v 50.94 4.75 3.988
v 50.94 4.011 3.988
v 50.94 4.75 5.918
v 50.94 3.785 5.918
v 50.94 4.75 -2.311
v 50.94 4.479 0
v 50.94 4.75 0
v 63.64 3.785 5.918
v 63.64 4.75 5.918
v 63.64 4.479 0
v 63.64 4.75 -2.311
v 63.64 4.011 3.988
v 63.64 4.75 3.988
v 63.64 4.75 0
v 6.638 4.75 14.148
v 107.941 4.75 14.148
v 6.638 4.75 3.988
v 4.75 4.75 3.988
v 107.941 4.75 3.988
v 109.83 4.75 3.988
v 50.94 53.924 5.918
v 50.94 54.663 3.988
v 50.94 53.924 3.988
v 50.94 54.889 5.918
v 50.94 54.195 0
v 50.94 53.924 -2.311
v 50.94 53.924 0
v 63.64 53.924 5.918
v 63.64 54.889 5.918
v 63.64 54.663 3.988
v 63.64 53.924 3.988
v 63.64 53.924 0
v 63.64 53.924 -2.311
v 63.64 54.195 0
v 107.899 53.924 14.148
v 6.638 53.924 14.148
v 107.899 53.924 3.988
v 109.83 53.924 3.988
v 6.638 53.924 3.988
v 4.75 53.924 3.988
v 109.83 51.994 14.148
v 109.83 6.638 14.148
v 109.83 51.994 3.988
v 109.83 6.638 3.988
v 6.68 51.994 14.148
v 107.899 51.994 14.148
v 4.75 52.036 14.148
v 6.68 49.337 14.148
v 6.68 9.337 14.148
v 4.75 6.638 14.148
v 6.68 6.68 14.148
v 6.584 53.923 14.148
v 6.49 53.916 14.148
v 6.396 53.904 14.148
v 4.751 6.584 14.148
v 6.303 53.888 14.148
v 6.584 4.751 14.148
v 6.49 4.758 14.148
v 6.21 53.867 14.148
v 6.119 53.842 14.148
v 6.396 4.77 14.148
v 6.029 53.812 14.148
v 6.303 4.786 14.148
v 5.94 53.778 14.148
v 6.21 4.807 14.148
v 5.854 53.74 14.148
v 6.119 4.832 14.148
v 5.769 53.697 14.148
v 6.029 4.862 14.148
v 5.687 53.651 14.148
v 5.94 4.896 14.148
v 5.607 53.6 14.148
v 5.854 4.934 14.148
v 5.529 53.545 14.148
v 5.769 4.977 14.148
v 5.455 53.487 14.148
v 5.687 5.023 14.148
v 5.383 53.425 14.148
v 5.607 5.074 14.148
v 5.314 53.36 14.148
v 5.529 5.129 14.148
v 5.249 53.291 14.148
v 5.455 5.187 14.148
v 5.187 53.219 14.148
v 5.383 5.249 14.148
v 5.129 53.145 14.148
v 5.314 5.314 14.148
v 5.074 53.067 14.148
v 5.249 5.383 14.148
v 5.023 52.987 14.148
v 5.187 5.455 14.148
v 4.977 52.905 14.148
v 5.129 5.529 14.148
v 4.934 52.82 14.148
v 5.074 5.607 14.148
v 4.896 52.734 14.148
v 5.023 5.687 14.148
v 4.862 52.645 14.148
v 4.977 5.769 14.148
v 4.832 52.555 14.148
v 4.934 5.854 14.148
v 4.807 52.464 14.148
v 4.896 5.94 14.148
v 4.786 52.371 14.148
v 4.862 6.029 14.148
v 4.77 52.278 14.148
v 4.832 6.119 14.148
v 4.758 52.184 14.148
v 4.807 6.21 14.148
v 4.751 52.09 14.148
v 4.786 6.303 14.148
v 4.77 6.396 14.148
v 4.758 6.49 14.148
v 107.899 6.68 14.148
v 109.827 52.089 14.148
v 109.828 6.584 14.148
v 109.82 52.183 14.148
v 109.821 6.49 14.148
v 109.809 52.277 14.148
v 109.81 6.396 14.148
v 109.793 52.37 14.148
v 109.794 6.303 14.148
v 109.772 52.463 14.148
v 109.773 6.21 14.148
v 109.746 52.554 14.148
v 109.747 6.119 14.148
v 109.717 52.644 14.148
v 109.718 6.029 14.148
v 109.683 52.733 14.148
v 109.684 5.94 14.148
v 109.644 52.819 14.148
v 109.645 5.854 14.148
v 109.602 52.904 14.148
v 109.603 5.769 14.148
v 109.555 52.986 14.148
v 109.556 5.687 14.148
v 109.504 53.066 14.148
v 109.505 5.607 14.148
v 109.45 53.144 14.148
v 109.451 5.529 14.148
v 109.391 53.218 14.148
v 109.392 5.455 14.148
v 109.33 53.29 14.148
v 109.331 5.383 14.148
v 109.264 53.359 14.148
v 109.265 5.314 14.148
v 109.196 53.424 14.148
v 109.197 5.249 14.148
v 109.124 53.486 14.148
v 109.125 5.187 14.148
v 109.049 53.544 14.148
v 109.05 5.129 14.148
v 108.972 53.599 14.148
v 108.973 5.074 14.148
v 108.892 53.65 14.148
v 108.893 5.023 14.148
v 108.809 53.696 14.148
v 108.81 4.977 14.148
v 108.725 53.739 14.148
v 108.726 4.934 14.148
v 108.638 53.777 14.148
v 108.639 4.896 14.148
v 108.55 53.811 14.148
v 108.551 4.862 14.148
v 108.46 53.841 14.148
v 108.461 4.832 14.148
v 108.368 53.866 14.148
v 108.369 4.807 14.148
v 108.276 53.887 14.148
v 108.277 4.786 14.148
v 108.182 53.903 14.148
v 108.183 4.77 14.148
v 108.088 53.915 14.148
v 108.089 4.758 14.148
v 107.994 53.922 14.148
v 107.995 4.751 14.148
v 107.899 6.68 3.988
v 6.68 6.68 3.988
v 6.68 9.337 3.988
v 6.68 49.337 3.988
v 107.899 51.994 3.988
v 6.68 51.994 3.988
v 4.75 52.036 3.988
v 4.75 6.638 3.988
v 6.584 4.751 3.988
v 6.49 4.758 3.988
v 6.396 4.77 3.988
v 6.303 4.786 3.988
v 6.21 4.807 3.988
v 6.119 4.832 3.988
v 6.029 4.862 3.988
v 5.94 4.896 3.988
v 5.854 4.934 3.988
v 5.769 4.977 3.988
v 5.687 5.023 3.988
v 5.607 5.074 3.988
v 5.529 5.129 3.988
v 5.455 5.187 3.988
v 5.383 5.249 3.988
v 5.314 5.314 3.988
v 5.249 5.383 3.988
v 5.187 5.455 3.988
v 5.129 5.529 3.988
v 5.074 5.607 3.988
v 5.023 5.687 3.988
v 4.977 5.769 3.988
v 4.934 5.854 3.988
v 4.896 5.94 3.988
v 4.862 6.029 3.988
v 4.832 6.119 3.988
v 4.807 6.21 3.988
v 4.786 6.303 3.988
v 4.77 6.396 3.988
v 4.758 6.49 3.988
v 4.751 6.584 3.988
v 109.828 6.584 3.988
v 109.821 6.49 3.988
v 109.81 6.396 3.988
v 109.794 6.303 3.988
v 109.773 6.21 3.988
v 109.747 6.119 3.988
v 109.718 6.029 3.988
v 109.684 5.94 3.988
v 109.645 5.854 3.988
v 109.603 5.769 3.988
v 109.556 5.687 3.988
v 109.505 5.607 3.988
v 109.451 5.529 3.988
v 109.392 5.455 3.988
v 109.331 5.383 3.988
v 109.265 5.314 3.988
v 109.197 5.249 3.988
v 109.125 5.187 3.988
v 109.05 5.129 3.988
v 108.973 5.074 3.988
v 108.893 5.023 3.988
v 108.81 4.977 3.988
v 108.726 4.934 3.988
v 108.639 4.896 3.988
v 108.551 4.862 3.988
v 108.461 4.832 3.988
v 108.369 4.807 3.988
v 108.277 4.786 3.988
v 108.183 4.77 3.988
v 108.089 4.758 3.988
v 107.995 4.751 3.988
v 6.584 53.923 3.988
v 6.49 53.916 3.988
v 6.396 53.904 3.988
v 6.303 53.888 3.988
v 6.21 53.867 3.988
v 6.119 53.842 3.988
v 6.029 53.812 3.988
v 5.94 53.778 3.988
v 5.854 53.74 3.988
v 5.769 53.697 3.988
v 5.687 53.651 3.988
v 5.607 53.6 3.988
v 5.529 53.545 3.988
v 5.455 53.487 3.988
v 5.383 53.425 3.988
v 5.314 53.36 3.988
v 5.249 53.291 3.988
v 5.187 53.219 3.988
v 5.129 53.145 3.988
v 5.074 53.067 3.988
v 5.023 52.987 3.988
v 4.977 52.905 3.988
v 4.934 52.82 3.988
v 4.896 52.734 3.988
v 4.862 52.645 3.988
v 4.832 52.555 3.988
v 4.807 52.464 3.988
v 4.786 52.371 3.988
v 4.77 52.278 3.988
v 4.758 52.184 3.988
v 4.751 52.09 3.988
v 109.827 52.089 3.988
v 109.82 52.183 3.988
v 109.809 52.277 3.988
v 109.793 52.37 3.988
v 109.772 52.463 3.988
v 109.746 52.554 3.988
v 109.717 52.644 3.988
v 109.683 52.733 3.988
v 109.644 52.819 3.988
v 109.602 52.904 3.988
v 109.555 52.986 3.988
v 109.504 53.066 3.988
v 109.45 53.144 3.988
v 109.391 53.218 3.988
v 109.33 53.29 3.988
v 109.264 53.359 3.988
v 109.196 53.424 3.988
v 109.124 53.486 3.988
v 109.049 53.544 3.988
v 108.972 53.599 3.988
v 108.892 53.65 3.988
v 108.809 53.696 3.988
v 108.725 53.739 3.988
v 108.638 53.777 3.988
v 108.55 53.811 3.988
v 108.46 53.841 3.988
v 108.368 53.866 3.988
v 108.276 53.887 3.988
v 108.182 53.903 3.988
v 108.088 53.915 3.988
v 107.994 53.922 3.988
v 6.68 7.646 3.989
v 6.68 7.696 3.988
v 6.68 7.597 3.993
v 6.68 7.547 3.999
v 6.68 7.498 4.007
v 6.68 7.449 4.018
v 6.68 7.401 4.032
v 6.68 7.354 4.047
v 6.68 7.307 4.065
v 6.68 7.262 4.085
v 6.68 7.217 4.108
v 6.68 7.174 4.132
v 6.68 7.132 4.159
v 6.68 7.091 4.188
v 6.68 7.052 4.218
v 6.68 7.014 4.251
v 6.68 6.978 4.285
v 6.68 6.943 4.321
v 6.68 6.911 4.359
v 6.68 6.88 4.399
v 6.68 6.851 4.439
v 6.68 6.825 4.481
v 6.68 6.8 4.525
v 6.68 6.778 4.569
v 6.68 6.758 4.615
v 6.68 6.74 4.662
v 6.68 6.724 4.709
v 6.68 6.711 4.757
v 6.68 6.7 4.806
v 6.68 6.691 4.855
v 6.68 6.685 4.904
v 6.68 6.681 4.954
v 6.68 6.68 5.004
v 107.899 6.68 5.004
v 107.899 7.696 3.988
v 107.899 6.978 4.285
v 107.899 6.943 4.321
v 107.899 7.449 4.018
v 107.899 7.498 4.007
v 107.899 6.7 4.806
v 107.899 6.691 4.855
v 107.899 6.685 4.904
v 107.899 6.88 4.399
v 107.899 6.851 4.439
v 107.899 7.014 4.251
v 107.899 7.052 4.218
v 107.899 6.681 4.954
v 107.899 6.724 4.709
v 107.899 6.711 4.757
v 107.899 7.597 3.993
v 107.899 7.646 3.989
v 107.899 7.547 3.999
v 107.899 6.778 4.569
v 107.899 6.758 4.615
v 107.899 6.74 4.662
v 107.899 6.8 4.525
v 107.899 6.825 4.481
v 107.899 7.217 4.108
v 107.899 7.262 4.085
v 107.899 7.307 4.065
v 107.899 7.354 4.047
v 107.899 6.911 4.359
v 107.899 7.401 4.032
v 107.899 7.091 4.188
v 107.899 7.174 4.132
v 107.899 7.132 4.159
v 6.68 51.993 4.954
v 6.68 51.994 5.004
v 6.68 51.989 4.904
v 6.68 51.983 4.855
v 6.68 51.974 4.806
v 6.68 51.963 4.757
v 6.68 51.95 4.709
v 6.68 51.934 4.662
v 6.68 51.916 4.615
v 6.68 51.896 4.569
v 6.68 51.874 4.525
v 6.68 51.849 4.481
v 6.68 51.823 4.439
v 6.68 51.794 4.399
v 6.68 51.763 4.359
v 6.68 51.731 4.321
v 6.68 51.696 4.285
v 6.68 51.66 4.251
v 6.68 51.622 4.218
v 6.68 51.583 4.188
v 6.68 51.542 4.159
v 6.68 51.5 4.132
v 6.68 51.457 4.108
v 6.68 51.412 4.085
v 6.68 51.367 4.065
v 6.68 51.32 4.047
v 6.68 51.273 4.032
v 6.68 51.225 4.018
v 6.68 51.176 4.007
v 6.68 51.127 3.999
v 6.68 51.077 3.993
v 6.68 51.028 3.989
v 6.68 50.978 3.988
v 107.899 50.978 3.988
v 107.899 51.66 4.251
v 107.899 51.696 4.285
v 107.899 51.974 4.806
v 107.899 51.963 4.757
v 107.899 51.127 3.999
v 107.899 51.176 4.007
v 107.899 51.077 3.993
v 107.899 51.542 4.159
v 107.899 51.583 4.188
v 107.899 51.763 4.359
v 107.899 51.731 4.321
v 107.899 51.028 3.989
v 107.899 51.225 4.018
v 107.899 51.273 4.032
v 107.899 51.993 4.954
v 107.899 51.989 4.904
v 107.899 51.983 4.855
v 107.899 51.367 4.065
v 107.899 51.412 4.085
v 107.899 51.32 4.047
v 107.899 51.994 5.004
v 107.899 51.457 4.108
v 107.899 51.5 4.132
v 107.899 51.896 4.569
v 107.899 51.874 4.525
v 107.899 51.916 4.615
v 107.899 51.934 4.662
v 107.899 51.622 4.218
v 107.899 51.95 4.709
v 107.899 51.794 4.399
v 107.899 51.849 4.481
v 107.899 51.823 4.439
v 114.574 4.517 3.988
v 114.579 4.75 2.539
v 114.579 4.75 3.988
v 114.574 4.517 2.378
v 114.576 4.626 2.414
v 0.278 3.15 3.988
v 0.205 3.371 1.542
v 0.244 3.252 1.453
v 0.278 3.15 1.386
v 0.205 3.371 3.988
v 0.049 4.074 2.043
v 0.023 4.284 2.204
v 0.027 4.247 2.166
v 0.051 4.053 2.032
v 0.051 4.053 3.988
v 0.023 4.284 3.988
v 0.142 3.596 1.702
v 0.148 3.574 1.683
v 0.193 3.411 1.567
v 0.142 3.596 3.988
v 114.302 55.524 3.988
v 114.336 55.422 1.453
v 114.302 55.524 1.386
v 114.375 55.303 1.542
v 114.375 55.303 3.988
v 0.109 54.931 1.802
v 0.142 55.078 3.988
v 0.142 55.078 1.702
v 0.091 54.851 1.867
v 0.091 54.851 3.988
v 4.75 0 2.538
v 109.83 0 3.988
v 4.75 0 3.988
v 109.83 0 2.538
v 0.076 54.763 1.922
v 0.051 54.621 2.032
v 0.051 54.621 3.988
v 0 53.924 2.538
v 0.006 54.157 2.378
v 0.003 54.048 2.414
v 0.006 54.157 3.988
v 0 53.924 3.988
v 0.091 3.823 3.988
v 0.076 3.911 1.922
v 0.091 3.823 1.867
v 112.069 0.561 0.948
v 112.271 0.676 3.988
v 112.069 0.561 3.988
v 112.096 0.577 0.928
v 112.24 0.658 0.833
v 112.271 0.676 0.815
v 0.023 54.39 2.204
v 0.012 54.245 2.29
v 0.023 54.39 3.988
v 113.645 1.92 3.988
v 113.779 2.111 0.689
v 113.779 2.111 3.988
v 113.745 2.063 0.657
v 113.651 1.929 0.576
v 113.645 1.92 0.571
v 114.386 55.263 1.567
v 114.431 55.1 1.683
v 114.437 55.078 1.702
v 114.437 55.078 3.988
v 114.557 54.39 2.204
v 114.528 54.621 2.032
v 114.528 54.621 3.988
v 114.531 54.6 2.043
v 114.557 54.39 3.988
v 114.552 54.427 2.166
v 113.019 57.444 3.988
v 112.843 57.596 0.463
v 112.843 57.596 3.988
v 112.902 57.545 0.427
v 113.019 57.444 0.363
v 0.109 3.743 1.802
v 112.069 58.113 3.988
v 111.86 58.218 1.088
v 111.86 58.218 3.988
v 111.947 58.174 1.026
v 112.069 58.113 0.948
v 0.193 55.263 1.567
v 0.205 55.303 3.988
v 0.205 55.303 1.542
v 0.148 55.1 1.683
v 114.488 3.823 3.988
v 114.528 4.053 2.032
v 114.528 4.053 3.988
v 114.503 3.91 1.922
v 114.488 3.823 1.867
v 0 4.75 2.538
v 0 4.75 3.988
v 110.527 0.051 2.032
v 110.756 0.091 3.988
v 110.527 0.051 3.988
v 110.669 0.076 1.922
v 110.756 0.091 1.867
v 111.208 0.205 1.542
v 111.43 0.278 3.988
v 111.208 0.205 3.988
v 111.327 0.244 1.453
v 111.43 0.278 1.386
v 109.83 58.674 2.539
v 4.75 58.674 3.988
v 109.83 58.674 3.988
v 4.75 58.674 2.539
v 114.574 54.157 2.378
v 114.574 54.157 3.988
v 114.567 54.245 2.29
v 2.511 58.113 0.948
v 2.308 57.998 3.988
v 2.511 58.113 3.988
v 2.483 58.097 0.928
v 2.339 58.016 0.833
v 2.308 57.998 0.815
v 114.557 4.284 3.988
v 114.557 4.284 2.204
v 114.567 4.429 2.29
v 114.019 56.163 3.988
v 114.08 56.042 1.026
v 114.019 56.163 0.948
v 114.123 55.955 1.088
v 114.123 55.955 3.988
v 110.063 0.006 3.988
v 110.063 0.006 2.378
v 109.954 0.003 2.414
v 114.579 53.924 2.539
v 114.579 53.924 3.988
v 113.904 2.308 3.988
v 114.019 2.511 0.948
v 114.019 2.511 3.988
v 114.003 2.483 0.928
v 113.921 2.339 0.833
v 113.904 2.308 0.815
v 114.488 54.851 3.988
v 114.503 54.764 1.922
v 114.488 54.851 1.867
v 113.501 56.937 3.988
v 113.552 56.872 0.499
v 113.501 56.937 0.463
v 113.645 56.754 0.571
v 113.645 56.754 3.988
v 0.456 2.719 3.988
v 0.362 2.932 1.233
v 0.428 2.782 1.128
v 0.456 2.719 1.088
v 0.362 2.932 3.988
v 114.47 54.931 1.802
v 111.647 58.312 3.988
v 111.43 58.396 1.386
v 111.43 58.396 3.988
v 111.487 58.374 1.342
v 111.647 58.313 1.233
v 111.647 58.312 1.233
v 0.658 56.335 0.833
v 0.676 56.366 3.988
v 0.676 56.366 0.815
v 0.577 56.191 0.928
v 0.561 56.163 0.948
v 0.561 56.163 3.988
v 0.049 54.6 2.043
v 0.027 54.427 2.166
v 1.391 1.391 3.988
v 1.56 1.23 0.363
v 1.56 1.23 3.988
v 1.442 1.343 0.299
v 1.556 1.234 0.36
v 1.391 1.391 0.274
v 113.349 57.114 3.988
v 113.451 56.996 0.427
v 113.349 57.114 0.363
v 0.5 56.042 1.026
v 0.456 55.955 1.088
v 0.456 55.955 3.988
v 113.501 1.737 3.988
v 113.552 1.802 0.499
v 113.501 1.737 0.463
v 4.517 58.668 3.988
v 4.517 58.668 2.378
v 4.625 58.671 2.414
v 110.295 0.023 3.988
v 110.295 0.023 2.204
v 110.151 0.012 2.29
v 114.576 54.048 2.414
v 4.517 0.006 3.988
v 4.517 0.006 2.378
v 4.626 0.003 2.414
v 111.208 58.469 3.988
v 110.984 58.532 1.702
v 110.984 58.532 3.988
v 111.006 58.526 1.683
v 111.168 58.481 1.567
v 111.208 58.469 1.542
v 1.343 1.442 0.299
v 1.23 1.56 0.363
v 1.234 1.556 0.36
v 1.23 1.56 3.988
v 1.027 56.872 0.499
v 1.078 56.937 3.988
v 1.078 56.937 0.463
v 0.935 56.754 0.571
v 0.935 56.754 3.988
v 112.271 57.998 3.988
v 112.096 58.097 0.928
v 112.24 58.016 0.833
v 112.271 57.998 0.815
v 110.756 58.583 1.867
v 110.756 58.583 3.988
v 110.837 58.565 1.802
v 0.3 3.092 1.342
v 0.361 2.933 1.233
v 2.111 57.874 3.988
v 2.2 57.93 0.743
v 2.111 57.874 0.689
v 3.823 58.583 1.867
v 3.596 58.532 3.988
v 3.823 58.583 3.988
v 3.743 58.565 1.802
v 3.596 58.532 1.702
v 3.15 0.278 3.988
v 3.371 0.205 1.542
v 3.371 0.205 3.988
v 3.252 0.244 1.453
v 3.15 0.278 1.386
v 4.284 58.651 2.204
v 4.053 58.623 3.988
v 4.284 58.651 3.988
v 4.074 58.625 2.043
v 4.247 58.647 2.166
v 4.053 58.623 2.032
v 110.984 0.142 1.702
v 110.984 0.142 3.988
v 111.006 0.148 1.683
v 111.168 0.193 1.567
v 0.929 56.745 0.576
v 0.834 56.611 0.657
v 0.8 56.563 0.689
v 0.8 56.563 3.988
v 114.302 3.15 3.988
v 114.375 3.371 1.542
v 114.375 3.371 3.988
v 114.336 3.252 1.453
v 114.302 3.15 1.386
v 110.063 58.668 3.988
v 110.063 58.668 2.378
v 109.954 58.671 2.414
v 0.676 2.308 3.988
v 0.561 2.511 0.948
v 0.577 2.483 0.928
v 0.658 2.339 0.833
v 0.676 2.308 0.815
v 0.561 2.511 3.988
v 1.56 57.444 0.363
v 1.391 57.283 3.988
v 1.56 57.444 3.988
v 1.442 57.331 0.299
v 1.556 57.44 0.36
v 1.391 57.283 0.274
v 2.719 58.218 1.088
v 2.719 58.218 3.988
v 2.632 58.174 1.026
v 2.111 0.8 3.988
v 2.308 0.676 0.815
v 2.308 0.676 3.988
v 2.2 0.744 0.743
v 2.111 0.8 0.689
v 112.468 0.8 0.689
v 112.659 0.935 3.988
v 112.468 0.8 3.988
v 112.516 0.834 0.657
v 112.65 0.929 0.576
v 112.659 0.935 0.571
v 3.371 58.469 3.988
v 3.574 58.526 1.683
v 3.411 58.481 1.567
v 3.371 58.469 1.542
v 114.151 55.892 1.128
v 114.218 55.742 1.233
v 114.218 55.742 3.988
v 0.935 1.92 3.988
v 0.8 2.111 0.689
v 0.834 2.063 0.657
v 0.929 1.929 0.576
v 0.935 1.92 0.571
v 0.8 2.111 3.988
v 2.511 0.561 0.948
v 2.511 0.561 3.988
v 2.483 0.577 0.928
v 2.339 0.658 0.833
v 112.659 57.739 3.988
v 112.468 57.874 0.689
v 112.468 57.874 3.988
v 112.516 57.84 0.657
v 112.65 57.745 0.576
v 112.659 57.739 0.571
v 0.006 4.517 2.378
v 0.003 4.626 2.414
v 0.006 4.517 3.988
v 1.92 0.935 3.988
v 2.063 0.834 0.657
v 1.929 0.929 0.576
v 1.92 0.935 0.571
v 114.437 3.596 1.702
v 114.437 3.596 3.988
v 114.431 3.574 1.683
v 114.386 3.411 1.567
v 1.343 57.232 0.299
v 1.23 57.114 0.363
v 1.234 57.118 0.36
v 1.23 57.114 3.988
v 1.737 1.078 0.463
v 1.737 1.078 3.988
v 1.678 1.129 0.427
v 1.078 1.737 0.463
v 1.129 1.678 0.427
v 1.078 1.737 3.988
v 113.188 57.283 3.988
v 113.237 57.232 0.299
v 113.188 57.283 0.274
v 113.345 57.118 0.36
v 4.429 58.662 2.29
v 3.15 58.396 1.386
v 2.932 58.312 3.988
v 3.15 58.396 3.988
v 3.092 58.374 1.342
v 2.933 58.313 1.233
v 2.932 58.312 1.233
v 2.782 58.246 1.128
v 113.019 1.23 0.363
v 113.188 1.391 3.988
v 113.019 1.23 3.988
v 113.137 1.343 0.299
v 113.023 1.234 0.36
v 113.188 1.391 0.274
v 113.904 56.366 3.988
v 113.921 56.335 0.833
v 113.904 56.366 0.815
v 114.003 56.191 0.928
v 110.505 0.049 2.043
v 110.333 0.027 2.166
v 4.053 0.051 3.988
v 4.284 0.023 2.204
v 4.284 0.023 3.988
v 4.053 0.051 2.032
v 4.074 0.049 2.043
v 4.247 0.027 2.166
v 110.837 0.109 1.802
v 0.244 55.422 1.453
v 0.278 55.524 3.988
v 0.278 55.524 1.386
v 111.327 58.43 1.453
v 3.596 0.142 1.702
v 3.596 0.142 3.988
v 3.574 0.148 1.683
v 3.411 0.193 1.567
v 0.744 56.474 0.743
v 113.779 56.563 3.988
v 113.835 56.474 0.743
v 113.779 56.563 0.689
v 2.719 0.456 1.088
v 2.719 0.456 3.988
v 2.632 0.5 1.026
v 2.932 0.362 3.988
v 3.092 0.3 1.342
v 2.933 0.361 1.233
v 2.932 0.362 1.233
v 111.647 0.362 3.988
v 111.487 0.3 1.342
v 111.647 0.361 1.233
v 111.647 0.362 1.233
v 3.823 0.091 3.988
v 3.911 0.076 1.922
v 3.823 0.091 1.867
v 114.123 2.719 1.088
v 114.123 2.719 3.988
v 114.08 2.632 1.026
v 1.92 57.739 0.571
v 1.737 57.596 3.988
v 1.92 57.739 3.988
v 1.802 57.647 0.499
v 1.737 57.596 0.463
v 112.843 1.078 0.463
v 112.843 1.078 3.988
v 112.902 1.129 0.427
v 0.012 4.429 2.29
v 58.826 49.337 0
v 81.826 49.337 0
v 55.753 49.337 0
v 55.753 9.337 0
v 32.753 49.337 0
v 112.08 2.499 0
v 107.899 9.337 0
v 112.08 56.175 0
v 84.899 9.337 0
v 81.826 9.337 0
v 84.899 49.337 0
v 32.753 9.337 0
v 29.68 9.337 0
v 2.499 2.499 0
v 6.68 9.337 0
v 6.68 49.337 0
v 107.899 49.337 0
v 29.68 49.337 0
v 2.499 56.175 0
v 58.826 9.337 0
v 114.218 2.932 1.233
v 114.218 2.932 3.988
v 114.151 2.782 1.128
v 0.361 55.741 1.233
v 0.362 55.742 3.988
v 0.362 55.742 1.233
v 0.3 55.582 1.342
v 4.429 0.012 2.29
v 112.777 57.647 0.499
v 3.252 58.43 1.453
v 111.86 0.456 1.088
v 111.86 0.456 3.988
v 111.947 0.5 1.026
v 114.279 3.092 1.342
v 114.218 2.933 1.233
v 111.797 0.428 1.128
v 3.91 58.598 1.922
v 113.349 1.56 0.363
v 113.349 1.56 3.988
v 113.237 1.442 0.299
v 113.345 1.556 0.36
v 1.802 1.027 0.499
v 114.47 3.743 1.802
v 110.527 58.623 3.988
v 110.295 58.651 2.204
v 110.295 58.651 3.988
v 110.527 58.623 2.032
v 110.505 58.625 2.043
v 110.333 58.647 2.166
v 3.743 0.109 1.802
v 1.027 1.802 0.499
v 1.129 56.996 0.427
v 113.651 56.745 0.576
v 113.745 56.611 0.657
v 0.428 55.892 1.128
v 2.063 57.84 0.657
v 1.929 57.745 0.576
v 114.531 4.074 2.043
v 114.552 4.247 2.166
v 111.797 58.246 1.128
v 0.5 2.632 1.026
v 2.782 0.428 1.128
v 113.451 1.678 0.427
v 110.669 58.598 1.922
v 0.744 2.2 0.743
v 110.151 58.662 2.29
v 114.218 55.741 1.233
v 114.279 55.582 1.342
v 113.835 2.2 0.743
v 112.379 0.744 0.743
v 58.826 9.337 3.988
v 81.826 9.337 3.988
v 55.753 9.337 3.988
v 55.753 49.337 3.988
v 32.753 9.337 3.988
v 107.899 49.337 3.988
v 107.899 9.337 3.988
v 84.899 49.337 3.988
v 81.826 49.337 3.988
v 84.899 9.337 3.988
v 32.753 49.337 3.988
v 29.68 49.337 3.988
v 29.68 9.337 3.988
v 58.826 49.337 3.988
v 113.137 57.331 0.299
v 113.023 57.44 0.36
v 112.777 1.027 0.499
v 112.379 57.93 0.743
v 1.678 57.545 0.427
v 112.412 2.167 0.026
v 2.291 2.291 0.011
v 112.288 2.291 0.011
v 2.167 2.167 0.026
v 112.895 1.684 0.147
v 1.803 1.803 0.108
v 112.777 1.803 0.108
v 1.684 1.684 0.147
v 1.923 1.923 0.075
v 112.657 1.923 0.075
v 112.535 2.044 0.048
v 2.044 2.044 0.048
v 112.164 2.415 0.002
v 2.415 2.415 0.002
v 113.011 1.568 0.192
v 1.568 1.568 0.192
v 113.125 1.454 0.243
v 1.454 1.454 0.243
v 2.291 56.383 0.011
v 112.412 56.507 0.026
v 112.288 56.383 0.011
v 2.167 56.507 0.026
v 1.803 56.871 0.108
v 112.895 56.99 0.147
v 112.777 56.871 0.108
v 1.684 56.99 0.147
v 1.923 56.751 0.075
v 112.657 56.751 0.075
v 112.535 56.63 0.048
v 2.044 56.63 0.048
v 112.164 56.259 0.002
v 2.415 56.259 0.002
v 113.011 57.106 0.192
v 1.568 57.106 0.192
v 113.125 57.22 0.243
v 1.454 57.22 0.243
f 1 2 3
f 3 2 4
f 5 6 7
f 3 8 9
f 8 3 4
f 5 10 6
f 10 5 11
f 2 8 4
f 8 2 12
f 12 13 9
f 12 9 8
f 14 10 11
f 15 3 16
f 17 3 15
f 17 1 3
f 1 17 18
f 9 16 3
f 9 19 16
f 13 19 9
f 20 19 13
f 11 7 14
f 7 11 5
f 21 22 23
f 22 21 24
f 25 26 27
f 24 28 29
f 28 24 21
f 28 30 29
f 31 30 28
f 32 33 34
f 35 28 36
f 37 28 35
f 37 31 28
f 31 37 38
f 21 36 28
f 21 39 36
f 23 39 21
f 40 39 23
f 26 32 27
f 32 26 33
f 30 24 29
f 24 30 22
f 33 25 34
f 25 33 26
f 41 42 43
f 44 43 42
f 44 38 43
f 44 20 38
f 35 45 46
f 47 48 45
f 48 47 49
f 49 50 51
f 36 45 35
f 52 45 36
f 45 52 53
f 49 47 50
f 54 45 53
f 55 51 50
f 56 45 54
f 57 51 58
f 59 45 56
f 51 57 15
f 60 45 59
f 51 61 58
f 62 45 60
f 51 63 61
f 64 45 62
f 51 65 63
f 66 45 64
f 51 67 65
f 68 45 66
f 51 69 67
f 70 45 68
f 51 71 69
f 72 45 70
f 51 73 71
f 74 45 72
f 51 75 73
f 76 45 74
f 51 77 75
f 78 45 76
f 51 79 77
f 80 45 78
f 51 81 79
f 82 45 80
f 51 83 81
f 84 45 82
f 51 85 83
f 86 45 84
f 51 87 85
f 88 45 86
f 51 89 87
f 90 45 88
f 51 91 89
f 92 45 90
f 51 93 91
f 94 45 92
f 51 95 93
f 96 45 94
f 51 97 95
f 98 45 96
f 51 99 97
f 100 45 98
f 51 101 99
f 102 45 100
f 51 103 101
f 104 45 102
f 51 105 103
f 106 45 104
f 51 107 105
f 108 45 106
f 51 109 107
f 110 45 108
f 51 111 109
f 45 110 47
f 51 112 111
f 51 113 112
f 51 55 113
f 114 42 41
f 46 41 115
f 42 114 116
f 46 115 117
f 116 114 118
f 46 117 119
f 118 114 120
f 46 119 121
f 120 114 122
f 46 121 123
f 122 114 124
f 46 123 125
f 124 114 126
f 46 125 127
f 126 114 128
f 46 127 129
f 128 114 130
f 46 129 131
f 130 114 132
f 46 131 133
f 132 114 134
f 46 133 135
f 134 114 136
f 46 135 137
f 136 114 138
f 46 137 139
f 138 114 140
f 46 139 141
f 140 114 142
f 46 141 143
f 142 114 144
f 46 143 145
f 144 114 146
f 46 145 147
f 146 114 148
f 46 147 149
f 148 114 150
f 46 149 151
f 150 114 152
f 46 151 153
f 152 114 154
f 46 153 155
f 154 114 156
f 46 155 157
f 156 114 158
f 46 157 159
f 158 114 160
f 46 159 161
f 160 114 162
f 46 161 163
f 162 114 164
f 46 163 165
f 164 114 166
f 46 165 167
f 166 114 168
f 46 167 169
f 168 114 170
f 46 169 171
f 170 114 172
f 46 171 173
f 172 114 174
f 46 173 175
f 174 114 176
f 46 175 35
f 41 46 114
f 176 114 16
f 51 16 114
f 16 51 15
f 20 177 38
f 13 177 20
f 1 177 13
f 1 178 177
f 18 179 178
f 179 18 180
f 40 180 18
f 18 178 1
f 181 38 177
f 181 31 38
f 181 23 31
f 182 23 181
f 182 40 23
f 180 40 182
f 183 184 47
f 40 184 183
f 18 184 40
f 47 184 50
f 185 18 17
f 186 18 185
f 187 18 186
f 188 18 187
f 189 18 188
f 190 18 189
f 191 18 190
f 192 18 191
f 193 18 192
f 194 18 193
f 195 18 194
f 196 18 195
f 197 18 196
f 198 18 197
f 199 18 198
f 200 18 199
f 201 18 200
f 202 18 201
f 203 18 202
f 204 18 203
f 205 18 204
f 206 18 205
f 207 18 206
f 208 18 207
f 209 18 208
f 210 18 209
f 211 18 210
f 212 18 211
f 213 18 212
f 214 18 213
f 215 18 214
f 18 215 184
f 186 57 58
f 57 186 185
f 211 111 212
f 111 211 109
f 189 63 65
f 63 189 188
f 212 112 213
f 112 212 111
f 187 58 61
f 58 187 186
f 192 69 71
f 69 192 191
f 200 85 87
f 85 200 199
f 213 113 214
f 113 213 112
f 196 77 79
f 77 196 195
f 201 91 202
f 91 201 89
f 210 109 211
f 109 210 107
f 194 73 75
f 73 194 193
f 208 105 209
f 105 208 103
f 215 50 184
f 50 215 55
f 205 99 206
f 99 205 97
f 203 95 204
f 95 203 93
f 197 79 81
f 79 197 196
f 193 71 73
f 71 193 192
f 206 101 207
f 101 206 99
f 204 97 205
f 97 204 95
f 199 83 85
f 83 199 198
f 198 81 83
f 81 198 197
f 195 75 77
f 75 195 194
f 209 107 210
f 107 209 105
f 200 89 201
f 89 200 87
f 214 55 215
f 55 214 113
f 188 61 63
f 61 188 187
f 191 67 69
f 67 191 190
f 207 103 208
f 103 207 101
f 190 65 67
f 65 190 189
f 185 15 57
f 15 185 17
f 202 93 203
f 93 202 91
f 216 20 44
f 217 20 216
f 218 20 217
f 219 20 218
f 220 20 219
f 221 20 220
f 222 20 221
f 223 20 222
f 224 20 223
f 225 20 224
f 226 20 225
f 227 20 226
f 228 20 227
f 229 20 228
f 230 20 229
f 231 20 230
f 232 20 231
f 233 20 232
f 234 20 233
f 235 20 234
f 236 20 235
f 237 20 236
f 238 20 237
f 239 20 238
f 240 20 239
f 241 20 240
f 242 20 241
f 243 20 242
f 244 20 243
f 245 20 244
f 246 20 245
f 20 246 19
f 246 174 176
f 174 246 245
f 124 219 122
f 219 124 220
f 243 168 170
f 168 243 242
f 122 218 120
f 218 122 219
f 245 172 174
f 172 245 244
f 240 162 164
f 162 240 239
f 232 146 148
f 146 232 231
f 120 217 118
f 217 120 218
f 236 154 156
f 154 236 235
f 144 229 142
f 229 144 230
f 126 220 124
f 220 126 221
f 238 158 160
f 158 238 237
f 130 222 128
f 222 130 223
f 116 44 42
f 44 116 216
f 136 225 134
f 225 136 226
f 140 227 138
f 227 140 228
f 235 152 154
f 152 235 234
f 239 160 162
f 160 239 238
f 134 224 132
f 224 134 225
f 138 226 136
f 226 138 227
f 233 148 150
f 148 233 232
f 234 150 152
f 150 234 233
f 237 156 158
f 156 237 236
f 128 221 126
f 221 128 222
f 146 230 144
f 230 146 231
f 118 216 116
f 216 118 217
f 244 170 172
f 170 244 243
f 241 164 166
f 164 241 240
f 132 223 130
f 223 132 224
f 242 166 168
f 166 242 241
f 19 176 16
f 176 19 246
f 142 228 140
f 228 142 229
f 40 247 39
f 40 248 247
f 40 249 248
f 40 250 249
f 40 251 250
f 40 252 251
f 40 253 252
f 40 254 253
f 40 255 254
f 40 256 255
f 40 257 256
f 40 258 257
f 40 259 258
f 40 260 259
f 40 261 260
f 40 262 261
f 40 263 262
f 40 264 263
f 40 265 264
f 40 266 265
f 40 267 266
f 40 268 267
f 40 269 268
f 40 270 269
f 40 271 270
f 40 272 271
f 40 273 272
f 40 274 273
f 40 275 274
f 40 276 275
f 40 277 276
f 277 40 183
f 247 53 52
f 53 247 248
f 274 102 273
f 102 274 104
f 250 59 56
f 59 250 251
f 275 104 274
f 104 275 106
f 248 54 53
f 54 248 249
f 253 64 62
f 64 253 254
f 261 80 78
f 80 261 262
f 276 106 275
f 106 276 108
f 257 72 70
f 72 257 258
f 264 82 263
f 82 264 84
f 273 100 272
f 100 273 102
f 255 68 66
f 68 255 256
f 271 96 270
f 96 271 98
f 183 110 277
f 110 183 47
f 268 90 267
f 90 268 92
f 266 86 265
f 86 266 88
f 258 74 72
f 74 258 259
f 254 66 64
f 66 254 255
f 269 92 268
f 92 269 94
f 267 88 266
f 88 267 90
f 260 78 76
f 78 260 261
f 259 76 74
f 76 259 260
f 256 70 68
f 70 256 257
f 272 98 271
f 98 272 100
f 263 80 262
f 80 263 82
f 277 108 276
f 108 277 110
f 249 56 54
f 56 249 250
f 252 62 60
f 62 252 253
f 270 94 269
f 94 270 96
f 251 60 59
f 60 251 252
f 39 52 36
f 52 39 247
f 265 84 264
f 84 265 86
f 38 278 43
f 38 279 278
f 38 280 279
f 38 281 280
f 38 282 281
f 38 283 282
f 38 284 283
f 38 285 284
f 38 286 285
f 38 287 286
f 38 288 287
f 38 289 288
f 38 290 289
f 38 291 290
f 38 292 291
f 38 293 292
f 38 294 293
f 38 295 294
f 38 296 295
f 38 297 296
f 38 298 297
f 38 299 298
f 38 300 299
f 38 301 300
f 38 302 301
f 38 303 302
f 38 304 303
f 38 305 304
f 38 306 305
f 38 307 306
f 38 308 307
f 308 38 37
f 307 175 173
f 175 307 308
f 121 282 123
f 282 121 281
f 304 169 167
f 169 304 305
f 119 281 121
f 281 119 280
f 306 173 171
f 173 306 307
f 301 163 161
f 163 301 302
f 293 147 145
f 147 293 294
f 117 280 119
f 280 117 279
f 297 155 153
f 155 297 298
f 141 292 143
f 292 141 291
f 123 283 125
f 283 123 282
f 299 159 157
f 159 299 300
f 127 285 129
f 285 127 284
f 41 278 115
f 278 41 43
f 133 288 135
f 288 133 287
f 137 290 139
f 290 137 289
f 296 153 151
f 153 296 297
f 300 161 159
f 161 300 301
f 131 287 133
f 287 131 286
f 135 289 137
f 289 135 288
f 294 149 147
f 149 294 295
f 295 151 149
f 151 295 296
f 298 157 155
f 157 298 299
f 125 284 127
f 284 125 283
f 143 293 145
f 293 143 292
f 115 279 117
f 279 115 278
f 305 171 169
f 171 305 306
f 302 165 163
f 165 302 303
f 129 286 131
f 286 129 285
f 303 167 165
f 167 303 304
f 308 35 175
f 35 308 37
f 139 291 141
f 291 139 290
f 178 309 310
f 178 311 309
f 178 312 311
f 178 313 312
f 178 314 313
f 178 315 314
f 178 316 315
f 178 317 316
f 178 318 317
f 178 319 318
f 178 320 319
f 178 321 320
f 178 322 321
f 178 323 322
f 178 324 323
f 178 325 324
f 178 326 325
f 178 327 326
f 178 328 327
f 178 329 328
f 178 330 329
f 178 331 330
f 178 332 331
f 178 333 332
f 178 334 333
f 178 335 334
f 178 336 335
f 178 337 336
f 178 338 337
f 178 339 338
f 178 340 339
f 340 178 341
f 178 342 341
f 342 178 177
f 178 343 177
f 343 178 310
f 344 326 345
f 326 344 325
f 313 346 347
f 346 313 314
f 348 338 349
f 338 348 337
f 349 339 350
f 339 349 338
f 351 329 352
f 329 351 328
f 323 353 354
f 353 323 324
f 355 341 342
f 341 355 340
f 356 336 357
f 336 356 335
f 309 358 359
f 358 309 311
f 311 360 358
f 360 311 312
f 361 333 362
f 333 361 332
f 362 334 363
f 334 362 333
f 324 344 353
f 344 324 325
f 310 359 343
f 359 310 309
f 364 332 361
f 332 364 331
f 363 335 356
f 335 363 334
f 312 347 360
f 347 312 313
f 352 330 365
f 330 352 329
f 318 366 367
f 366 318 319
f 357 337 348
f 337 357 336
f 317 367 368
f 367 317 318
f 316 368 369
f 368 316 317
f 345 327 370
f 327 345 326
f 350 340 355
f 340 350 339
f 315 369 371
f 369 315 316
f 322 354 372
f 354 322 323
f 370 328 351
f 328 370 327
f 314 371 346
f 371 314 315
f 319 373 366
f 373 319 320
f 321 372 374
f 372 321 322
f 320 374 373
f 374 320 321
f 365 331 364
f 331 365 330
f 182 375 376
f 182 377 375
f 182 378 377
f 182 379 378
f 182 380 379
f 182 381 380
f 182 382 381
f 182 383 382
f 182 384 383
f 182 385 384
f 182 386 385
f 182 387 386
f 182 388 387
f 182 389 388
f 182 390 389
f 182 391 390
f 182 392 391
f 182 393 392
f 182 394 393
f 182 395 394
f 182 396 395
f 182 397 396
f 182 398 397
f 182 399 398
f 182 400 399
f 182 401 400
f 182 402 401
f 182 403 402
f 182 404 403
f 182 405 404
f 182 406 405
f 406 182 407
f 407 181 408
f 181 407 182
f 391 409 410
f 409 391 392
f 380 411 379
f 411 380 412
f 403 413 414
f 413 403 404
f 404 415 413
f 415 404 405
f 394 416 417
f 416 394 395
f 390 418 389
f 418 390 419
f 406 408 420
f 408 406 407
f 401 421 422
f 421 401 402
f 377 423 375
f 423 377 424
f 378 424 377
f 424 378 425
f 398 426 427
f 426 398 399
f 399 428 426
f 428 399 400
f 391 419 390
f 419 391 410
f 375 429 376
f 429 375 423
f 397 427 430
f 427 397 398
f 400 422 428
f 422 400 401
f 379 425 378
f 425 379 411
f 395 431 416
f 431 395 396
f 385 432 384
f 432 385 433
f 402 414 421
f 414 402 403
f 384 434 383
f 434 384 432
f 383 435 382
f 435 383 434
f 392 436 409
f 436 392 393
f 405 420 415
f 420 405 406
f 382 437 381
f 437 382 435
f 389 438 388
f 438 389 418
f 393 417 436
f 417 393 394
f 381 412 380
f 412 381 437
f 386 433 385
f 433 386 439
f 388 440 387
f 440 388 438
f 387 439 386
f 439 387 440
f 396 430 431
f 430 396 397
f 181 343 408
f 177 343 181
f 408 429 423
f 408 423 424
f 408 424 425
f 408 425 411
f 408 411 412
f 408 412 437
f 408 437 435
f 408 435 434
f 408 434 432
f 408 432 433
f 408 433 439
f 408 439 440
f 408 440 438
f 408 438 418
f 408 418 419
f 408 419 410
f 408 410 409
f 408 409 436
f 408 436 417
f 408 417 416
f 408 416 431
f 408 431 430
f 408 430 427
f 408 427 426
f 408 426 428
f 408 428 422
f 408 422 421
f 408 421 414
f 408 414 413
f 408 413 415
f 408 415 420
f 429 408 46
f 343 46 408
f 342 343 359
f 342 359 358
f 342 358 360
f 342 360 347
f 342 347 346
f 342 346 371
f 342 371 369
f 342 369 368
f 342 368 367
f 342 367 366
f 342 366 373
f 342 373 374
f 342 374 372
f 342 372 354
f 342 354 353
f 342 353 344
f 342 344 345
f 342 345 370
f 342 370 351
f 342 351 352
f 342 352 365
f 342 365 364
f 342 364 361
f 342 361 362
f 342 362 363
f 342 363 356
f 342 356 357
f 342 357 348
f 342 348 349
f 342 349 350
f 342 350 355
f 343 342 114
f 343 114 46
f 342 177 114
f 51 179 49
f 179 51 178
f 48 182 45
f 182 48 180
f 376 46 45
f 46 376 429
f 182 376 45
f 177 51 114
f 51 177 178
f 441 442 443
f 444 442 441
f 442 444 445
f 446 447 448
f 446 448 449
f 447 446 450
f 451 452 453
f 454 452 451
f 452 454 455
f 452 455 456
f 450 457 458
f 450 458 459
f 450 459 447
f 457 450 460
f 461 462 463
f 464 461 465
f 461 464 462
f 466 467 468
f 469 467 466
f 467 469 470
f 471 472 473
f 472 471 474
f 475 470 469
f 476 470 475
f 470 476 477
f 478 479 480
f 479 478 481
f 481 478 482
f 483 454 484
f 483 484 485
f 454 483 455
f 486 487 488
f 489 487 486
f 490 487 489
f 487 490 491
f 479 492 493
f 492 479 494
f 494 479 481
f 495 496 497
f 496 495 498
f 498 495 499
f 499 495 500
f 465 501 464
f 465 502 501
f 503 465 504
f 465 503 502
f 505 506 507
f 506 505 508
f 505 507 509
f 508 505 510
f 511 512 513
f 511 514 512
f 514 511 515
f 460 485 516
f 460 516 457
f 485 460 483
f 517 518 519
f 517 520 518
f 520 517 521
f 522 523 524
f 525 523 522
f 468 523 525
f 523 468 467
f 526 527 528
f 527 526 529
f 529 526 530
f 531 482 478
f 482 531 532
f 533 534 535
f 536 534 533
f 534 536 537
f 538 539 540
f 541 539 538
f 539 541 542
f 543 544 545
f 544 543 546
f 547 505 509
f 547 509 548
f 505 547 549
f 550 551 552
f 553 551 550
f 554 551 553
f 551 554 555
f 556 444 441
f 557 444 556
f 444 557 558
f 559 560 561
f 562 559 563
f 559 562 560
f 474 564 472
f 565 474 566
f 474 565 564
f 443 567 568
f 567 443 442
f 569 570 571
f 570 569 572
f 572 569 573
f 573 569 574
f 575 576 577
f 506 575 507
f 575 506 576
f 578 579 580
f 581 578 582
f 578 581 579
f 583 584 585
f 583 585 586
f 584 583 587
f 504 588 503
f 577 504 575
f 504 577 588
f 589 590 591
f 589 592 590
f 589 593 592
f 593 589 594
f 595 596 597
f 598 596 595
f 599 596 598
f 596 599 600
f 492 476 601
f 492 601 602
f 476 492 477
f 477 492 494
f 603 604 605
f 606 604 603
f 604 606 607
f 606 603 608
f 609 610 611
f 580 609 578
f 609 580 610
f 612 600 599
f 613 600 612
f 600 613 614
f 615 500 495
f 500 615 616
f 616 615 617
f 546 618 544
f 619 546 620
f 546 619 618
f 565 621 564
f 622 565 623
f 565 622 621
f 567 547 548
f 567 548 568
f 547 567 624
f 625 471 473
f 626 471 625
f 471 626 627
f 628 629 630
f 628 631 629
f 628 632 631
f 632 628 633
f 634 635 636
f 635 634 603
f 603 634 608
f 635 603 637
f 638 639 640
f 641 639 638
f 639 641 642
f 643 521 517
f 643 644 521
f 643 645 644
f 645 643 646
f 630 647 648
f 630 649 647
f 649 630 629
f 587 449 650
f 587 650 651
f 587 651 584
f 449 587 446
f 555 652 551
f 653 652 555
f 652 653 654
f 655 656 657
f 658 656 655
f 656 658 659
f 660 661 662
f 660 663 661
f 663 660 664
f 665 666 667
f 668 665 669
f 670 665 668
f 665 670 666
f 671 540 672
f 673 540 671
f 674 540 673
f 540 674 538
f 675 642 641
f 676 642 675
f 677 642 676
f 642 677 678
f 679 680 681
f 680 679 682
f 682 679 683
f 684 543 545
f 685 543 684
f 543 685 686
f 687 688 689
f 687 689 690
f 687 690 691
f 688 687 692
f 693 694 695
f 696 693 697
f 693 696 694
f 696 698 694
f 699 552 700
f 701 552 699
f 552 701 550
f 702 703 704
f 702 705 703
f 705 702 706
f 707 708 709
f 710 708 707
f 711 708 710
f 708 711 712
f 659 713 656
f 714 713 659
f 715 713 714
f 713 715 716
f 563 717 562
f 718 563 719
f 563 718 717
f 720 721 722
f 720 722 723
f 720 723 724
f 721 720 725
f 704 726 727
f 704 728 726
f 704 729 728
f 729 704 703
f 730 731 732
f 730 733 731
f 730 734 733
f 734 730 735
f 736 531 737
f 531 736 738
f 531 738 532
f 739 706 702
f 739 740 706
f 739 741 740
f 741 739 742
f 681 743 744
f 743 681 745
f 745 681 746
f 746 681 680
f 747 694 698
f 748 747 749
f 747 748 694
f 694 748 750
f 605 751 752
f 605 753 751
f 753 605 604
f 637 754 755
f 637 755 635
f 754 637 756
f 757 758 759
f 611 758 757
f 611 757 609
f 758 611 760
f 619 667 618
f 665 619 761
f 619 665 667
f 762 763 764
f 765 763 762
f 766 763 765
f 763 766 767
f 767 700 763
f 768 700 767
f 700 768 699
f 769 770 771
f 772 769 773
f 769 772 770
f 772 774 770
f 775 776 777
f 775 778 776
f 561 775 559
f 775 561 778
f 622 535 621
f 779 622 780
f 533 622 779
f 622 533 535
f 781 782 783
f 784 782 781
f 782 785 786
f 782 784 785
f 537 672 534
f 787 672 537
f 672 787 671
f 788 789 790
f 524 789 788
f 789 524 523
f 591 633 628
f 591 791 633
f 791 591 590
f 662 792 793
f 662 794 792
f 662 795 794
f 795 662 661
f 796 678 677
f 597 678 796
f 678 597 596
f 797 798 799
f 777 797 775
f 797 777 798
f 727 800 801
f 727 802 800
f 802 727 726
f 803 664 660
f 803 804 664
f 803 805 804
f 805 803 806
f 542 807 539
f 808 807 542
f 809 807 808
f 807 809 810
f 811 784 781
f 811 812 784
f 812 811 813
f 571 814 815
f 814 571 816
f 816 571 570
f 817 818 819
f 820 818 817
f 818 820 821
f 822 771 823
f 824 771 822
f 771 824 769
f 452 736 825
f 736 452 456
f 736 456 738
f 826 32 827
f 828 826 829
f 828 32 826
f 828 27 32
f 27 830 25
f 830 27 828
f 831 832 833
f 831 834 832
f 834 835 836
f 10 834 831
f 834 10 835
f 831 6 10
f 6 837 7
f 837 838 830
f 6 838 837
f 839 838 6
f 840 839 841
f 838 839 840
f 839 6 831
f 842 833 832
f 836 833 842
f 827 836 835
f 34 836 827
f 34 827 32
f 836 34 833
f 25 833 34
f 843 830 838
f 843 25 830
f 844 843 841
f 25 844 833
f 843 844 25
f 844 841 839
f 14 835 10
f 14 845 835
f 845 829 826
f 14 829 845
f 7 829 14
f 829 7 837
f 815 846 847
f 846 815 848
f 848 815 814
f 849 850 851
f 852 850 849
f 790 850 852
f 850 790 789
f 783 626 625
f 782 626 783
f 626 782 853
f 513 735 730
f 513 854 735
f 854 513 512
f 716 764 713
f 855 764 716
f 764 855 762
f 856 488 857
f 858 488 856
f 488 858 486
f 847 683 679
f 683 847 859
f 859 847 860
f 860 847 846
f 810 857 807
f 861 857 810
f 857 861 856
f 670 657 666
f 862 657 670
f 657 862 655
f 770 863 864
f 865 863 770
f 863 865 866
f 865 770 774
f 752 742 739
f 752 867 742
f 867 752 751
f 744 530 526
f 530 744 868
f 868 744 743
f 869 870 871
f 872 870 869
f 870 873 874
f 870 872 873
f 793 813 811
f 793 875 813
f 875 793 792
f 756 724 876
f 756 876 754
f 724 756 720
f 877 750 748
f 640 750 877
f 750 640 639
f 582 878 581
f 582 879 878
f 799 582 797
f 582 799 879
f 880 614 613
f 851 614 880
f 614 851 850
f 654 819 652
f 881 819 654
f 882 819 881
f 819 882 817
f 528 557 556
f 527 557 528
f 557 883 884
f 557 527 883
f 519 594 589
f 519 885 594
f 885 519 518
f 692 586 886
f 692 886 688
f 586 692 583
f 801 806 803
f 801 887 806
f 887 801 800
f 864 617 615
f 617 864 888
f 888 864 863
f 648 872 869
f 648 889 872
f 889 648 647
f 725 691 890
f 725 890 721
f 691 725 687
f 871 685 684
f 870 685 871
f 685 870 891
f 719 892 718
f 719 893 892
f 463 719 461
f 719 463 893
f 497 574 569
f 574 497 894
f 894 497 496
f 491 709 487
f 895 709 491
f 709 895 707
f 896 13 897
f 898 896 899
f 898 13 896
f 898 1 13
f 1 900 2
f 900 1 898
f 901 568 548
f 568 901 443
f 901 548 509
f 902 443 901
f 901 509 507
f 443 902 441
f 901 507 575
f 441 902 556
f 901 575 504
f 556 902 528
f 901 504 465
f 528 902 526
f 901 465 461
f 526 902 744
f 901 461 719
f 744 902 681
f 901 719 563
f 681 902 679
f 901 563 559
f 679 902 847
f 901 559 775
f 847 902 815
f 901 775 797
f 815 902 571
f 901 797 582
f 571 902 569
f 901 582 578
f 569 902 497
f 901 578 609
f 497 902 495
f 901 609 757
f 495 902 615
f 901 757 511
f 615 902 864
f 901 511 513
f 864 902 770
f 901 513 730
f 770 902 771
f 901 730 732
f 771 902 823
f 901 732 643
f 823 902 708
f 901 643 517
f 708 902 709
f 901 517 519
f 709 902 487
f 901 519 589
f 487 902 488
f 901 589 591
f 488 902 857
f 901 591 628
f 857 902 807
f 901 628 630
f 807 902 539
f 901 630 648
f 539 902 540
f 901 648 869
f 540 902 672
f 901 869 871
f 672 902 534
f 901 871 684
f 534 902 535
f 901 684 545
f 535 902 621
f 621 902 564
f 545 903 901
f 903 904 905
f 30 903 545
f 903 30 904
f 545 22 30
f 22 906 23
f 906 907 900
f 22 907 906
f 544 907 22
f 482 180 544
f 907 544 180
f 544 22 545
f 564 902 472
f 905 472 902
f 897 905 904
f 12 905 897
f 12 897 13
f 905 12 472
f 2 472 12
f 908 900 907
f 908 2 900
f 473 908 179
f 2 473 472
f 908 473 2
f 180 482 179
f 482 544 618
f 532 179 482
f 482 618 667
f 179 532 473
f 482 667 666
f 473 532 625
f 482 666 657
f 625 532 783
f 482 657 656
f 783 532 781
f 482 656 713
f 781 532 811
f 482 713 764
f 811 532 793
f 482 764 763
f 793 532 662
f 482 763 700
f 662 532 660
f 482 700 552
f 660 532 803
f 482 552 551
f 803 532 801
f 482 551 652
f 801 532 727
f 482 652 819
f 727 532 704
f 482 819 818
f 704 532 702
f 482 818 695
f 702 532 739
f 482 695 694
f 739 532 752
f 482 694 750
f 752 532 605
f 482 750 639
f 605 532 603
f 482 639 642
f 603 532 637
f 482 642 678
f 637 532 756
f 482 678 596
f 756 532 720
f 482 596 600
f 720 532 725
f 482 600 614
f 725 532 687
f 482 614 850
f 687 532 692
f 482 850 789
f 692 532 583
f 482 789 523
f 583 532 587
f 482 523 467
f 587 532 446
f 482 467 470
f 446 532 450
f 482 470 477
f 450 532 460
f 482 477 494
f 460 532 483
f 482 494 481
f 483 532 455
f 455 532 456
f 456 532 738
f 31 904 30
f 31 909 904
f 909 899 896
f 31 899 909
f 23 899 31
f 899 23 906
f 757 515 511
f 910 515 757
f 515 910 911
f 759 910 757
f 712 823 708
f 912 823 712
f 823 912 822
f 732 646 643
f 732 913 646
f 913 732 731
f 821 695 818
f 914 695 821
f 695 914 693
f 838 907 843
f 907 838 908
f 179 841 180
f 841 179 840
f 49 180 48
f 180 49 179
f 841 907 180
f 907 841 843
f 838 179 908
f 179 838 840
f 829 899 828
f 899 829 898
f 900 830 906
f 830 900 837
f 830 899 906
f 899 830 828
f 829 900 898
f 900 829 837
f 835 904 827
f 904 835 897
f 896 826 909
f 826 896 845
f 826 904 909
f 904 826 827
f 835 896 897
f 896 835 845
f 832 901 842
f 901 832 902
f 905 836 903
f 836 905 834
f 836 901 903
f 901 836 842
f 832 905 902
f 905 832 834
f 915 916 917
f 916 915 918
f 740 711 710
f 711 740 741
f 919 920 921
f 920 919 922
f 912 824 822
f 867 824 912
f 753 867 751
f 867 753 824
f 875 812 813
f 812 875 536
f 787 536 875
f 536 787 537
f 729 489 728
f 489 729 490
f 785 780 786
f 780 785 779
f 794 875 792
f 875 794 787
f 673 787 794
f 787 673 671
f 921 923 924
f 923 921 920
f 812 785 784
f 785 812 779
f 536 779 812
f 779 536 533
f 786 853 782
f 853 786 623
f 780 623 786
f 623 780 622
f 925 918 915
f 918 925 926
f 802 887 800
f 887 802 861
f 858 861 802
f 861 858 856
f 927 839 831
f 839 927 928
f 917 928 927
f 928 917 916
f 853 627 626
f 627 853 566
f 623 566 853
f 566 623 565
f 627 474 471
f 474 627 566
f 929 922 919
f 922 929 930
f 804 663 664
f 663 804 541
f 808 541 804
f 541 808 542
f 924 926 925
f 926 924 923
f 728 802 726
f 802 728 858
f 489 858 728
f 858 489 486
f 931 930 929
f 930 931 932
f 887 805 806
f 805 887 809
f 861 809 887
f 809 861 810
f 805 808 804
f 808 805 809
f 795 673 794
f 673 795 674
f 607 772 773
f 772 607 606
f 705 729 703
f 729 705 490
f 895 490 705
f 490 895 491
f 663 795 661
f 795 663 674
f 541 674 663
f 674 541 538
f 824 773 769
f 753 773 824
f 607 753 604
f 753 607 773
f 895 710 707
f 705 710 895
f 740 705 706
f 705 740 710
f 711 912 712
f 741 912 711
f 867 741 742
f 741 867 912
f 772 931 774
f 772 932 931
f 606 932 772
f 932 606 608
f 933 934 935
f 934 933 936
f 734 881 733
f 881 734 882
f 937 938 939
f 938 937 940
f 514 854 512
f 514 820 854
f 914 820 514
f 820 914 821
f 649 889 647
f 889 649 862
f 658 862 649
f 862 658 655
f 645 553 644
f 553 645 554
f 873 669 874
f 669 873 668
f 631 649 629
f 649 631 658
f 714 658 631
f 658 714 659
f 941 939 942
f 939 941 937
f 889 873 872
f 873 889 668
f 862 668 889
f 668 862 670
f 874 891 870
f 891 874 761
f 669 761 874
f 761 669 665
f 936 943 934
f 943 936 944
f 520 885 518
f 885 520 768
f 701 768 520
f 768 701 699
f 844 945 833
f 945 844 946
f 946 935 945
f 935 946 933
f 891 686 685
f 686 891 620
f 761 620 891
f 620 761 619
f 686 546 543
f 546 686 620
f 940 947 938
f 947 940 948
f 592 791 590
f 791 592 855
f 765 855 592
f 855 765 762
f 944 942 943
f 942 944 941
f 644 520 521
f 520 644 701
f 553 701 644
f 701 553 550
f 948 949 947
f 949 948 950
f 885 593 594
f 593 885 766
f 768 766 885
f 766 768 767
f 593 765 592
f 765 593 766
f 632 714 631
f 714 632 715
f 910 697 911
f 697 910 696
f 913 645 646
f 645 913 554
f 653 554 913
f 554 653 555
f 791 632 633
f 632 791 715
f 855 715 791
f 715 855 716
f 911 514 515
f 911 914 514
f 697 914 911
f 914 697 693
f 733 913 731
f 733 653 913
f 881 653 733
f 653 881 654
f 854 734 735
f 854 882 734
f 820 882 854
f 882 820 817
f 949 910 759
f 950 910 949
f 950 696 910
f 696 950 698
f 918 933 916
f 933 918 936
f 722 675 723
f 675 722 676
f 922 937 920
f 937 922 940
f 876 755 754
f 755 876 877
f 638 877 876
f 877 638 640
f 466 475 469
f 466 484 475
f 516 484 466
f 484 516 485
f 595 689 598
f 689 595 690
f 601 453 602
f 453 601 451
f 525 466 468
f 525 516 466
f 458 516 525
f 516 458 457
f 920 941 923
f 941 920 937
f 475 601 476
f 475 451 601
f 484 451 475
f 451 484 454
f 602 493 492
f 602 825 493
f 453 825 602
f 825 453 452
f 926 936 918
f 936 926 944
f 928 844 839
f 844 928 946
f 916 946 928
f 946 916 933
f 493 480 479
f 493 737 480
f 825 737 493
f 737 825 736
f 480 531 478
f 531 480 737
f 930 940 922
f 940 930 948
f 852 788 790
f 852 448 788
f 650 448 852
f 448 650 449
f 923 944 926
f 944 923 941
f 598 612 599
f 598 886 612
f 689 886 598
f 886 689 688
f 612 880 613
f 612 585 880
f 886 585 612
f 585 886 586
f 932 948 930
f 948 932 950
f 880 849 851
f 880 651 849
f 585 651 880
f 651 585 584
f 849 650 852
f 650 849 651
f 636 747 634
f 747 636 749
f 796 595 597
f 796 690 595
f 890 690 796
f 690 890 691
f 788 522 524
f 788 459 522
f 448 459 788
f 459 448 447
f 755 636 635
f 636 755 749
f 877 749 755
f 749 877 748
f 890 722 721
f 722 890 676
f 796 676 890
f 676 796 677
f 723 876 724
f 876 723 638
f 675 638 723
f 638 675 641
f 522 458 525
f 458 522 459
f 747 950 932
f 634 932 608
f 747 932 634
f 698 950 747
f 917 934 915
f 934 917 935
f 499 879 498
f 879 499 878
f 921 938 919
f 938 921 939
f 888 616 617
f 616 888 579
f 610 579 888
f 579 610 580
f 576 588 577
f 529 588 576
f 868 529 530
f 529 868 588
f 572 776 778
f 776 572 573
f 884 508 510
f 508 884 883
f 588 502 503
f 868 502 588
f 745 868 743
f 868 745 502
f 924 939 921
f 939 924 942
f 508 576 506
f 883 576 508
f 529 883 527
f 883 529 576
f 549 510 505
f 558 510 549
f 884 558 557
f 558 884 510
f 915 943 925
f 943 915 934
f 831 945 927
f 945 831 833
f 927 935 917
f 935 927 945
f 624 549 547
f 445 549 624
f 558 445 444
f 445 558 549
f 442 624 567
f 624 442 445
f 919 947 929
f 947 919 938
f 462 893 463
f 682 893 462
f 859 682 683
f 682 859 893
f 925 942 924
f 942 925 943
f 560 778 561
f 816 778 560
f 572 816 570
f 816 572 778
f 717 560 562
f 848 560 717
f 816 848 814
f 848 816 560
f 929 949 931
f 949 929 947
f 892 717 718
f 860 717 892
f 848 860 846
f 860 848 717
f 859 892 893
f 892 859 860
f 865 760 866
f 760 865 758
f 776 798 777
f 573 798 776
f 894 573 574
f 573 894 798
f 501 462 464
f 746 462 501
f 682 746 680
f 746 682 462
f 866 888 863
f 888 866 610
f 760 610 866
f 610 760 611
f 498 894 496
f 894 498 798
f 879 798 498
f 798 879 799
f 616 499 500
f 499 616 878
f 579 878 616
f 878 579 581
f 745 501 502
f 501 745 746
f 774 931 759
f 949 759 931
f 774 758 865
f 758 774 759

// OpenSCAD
 $fn = $preview ? $fn : 128;
 $fs = $preview ? $fs : 0.01;
 delta = $preview ? 0.01: 0.001;
 in2mm = 25.4;
 
flangeWidth=       0.187 * in2mm;
 

// measurements based upon outer size
// width =            4.43  * in2mm;
// depth =            2.275 * in2mm;
// innerBoxWidth=     width - 2*flangeWidth; 
//innerBoxDepth=     depth - 2* flangeWidth; 

// measurements based upon hole size
innerBoxWidth=     4.137* in2mm; 
innerBoxDepth=     1.936* in2mm;
width =            innerBoxWidth + 2* flangeWidth;
depth =            innerBoxDepth + 2* flangeWidth;

 flangeZ =          0.157 * in2mm;
 flangeRadius =     flangeWidth;//0.1   * in2mm;
 flangeD = flangeRadius*2;
 innerBoxHeight =   0.4   * in2mm;
 innerBoxWall =     0.076 * in2mm;
 switchWidth = 23;
 switchDepth = 40;
 rounding = .04*in2mm;
 switchHeight = innerBoxHeight+flangeZ+(0.5*in2mm);
 flangeRounding = 0.1 * in2mm;
 snapWidth = 0.5 * in2mm;
 panelThickness = innerBoxWall;
 snapDepth = innerBoxWall/2;
 snapHeight = innerBoxHeight - panelThickness;
//========================================================================
module flangeRound(x=10,y=10,r=5){
    translate([0,0,-delta])
    {
        union()
        {
            roundRemove(x,r);
            translate([0,y,0])
                mirror([0,1,0])
                    roundRemove(x,r);
            mirror([1,0,0])
                rotate([0,0,90])
                    roundRemove(y,r);
            translate([x,0,0])
                rotate([0,0,90])
                    roundRemove(y,r);
        }
    }
}
//========================================================================
module top() {
     circleX = width - flangeD;
     circleY = depth - flangeD;
     translate([flangeRadius,flangeRadius,0])
     {
        linear_extrude(height = flangeZ)
        {
            hull()
            {
                for (x=[0:1]) for(y=[0:1])
                    translate([x*circleX,y*circleY,0])
                        circle(flangeRadius);
            }
        }
     }
 }
//========================================================================
module roundRemove(d=100,r=5){
    translate([d,r,0])
        rotate([0,90,-180])
            translate([-r,0,0])
                difference()
                {
                    linear_extrude(d)
                        square(r);
                    linear_extrude(d)
                        circle(r);
                }
}
//========================================================================
module innerBoxRemove(){
    difference()
    {
        cube([innerBoxWidth-2*innerBoxWall,innerBoxDepth-2*innerBoxWall,innerBoxHeight+delta]);
            roundRemove(d= innerBoxWidth-2*innerBoxWall,r=rounding);
        translate([0,innerBoxDepth-2*innerBoxWall,0])
        rotate([90,0,0])
            roundRemove(d= innerBoxWidth-2*innerBoxWall,r=rounding);
    }    
}
//========================================================================
module innerBoxOutsideRound(r=10){
    translate([-delta,-delta,0])
    mirror([1,0,0])
        rotate([0,-90,0])
            roundRemove(d=innerBoxHeight,r=r);
    
    translate([innerBoxWidth+delta,-delta,0])
        rotate([0,-90,0])
            roundRemove(d=innerBoxHeight,r=r);
    translate([0,innerBoxDepth+delta,0])
    mirror([0,1,0])
    {
        translate([-delta,0,0])
        mirror([1,0,0])
            rotate([0,-90,0])
                roundRemove(d=innerBoxHeight,r=r);
        translate([0,delta,0])
        translate([innerBoxWidth,0,0])
            rotate([0,-90,0])
                roundRemove(d=innerBoxHeight,r=r);
    }
}
//========================================================================
module snap(x=10,y=20,w=30)
{
    translate([-w/2,0,0]) rotate([90,0,0]) 
        mirror([0,1,0]) mirror([0,0,1]) rotate([0,90,0]) 
            linear_extrude(w)
                polygon([[0,0],[x,0],[0,y]]);
}
//========================================================================
module innerBoxOutside(){
    difference()
    {
        union() 
        {
            cube([innerBoxWidth,innerBoxDepth,innerBoxHeight]);
            translate([innerBoxWidth/2,0,panelThickness])     
            {       
                snap(snapDepth,snapHeight,snapWidth);
                translate([0,innerBoxDepth,0])
                mirror([0,1,0])
                snap(snapDepth,snapHeight,snapWidth);
            }
        }
        innerBoxOutsideRound(innerBoxWall);
    }
}
//========================================================================
module innerbox(){
    translate([(width-innerBoxWidth)/2,
               (depth-innerBoxDepth)/2,
               flangeZ])
    difference()
    {
        innerBoxOutside();
        translate([innerBoxWall,innerBoxWall,0])
        {
            innerBoxRemove();
        }
    }
}
//========================================================================
module switch()
{
    cube([switchWidth,switchDepth,switchHeight+2*delta]);
}
//========================================================================
module switchHole(n=4){
    d= (width-2*(flangeWidth+innerBoxWall));
    b = (d-(4*switchWidth))/(n-1);
    translate([flangeWidth+innerBoxWall,(depth-switchDepth)/2,-delta])
    {
        for (index = [0:n-1])
        {
            offset = (switchWidth+b)*index;
            translate([offset,0,0])
                switch();
        }
    }
}
//========================================================================
module switchHolder(){
    difference ()
    {
        union()
        {
            top();
            innerbox();
        }
        switchHole();
        flangeRound(width,depth,flangeRounding);        
    }    
}
//========================================================================
// Main Code
//========================================================================
switchHolder();
